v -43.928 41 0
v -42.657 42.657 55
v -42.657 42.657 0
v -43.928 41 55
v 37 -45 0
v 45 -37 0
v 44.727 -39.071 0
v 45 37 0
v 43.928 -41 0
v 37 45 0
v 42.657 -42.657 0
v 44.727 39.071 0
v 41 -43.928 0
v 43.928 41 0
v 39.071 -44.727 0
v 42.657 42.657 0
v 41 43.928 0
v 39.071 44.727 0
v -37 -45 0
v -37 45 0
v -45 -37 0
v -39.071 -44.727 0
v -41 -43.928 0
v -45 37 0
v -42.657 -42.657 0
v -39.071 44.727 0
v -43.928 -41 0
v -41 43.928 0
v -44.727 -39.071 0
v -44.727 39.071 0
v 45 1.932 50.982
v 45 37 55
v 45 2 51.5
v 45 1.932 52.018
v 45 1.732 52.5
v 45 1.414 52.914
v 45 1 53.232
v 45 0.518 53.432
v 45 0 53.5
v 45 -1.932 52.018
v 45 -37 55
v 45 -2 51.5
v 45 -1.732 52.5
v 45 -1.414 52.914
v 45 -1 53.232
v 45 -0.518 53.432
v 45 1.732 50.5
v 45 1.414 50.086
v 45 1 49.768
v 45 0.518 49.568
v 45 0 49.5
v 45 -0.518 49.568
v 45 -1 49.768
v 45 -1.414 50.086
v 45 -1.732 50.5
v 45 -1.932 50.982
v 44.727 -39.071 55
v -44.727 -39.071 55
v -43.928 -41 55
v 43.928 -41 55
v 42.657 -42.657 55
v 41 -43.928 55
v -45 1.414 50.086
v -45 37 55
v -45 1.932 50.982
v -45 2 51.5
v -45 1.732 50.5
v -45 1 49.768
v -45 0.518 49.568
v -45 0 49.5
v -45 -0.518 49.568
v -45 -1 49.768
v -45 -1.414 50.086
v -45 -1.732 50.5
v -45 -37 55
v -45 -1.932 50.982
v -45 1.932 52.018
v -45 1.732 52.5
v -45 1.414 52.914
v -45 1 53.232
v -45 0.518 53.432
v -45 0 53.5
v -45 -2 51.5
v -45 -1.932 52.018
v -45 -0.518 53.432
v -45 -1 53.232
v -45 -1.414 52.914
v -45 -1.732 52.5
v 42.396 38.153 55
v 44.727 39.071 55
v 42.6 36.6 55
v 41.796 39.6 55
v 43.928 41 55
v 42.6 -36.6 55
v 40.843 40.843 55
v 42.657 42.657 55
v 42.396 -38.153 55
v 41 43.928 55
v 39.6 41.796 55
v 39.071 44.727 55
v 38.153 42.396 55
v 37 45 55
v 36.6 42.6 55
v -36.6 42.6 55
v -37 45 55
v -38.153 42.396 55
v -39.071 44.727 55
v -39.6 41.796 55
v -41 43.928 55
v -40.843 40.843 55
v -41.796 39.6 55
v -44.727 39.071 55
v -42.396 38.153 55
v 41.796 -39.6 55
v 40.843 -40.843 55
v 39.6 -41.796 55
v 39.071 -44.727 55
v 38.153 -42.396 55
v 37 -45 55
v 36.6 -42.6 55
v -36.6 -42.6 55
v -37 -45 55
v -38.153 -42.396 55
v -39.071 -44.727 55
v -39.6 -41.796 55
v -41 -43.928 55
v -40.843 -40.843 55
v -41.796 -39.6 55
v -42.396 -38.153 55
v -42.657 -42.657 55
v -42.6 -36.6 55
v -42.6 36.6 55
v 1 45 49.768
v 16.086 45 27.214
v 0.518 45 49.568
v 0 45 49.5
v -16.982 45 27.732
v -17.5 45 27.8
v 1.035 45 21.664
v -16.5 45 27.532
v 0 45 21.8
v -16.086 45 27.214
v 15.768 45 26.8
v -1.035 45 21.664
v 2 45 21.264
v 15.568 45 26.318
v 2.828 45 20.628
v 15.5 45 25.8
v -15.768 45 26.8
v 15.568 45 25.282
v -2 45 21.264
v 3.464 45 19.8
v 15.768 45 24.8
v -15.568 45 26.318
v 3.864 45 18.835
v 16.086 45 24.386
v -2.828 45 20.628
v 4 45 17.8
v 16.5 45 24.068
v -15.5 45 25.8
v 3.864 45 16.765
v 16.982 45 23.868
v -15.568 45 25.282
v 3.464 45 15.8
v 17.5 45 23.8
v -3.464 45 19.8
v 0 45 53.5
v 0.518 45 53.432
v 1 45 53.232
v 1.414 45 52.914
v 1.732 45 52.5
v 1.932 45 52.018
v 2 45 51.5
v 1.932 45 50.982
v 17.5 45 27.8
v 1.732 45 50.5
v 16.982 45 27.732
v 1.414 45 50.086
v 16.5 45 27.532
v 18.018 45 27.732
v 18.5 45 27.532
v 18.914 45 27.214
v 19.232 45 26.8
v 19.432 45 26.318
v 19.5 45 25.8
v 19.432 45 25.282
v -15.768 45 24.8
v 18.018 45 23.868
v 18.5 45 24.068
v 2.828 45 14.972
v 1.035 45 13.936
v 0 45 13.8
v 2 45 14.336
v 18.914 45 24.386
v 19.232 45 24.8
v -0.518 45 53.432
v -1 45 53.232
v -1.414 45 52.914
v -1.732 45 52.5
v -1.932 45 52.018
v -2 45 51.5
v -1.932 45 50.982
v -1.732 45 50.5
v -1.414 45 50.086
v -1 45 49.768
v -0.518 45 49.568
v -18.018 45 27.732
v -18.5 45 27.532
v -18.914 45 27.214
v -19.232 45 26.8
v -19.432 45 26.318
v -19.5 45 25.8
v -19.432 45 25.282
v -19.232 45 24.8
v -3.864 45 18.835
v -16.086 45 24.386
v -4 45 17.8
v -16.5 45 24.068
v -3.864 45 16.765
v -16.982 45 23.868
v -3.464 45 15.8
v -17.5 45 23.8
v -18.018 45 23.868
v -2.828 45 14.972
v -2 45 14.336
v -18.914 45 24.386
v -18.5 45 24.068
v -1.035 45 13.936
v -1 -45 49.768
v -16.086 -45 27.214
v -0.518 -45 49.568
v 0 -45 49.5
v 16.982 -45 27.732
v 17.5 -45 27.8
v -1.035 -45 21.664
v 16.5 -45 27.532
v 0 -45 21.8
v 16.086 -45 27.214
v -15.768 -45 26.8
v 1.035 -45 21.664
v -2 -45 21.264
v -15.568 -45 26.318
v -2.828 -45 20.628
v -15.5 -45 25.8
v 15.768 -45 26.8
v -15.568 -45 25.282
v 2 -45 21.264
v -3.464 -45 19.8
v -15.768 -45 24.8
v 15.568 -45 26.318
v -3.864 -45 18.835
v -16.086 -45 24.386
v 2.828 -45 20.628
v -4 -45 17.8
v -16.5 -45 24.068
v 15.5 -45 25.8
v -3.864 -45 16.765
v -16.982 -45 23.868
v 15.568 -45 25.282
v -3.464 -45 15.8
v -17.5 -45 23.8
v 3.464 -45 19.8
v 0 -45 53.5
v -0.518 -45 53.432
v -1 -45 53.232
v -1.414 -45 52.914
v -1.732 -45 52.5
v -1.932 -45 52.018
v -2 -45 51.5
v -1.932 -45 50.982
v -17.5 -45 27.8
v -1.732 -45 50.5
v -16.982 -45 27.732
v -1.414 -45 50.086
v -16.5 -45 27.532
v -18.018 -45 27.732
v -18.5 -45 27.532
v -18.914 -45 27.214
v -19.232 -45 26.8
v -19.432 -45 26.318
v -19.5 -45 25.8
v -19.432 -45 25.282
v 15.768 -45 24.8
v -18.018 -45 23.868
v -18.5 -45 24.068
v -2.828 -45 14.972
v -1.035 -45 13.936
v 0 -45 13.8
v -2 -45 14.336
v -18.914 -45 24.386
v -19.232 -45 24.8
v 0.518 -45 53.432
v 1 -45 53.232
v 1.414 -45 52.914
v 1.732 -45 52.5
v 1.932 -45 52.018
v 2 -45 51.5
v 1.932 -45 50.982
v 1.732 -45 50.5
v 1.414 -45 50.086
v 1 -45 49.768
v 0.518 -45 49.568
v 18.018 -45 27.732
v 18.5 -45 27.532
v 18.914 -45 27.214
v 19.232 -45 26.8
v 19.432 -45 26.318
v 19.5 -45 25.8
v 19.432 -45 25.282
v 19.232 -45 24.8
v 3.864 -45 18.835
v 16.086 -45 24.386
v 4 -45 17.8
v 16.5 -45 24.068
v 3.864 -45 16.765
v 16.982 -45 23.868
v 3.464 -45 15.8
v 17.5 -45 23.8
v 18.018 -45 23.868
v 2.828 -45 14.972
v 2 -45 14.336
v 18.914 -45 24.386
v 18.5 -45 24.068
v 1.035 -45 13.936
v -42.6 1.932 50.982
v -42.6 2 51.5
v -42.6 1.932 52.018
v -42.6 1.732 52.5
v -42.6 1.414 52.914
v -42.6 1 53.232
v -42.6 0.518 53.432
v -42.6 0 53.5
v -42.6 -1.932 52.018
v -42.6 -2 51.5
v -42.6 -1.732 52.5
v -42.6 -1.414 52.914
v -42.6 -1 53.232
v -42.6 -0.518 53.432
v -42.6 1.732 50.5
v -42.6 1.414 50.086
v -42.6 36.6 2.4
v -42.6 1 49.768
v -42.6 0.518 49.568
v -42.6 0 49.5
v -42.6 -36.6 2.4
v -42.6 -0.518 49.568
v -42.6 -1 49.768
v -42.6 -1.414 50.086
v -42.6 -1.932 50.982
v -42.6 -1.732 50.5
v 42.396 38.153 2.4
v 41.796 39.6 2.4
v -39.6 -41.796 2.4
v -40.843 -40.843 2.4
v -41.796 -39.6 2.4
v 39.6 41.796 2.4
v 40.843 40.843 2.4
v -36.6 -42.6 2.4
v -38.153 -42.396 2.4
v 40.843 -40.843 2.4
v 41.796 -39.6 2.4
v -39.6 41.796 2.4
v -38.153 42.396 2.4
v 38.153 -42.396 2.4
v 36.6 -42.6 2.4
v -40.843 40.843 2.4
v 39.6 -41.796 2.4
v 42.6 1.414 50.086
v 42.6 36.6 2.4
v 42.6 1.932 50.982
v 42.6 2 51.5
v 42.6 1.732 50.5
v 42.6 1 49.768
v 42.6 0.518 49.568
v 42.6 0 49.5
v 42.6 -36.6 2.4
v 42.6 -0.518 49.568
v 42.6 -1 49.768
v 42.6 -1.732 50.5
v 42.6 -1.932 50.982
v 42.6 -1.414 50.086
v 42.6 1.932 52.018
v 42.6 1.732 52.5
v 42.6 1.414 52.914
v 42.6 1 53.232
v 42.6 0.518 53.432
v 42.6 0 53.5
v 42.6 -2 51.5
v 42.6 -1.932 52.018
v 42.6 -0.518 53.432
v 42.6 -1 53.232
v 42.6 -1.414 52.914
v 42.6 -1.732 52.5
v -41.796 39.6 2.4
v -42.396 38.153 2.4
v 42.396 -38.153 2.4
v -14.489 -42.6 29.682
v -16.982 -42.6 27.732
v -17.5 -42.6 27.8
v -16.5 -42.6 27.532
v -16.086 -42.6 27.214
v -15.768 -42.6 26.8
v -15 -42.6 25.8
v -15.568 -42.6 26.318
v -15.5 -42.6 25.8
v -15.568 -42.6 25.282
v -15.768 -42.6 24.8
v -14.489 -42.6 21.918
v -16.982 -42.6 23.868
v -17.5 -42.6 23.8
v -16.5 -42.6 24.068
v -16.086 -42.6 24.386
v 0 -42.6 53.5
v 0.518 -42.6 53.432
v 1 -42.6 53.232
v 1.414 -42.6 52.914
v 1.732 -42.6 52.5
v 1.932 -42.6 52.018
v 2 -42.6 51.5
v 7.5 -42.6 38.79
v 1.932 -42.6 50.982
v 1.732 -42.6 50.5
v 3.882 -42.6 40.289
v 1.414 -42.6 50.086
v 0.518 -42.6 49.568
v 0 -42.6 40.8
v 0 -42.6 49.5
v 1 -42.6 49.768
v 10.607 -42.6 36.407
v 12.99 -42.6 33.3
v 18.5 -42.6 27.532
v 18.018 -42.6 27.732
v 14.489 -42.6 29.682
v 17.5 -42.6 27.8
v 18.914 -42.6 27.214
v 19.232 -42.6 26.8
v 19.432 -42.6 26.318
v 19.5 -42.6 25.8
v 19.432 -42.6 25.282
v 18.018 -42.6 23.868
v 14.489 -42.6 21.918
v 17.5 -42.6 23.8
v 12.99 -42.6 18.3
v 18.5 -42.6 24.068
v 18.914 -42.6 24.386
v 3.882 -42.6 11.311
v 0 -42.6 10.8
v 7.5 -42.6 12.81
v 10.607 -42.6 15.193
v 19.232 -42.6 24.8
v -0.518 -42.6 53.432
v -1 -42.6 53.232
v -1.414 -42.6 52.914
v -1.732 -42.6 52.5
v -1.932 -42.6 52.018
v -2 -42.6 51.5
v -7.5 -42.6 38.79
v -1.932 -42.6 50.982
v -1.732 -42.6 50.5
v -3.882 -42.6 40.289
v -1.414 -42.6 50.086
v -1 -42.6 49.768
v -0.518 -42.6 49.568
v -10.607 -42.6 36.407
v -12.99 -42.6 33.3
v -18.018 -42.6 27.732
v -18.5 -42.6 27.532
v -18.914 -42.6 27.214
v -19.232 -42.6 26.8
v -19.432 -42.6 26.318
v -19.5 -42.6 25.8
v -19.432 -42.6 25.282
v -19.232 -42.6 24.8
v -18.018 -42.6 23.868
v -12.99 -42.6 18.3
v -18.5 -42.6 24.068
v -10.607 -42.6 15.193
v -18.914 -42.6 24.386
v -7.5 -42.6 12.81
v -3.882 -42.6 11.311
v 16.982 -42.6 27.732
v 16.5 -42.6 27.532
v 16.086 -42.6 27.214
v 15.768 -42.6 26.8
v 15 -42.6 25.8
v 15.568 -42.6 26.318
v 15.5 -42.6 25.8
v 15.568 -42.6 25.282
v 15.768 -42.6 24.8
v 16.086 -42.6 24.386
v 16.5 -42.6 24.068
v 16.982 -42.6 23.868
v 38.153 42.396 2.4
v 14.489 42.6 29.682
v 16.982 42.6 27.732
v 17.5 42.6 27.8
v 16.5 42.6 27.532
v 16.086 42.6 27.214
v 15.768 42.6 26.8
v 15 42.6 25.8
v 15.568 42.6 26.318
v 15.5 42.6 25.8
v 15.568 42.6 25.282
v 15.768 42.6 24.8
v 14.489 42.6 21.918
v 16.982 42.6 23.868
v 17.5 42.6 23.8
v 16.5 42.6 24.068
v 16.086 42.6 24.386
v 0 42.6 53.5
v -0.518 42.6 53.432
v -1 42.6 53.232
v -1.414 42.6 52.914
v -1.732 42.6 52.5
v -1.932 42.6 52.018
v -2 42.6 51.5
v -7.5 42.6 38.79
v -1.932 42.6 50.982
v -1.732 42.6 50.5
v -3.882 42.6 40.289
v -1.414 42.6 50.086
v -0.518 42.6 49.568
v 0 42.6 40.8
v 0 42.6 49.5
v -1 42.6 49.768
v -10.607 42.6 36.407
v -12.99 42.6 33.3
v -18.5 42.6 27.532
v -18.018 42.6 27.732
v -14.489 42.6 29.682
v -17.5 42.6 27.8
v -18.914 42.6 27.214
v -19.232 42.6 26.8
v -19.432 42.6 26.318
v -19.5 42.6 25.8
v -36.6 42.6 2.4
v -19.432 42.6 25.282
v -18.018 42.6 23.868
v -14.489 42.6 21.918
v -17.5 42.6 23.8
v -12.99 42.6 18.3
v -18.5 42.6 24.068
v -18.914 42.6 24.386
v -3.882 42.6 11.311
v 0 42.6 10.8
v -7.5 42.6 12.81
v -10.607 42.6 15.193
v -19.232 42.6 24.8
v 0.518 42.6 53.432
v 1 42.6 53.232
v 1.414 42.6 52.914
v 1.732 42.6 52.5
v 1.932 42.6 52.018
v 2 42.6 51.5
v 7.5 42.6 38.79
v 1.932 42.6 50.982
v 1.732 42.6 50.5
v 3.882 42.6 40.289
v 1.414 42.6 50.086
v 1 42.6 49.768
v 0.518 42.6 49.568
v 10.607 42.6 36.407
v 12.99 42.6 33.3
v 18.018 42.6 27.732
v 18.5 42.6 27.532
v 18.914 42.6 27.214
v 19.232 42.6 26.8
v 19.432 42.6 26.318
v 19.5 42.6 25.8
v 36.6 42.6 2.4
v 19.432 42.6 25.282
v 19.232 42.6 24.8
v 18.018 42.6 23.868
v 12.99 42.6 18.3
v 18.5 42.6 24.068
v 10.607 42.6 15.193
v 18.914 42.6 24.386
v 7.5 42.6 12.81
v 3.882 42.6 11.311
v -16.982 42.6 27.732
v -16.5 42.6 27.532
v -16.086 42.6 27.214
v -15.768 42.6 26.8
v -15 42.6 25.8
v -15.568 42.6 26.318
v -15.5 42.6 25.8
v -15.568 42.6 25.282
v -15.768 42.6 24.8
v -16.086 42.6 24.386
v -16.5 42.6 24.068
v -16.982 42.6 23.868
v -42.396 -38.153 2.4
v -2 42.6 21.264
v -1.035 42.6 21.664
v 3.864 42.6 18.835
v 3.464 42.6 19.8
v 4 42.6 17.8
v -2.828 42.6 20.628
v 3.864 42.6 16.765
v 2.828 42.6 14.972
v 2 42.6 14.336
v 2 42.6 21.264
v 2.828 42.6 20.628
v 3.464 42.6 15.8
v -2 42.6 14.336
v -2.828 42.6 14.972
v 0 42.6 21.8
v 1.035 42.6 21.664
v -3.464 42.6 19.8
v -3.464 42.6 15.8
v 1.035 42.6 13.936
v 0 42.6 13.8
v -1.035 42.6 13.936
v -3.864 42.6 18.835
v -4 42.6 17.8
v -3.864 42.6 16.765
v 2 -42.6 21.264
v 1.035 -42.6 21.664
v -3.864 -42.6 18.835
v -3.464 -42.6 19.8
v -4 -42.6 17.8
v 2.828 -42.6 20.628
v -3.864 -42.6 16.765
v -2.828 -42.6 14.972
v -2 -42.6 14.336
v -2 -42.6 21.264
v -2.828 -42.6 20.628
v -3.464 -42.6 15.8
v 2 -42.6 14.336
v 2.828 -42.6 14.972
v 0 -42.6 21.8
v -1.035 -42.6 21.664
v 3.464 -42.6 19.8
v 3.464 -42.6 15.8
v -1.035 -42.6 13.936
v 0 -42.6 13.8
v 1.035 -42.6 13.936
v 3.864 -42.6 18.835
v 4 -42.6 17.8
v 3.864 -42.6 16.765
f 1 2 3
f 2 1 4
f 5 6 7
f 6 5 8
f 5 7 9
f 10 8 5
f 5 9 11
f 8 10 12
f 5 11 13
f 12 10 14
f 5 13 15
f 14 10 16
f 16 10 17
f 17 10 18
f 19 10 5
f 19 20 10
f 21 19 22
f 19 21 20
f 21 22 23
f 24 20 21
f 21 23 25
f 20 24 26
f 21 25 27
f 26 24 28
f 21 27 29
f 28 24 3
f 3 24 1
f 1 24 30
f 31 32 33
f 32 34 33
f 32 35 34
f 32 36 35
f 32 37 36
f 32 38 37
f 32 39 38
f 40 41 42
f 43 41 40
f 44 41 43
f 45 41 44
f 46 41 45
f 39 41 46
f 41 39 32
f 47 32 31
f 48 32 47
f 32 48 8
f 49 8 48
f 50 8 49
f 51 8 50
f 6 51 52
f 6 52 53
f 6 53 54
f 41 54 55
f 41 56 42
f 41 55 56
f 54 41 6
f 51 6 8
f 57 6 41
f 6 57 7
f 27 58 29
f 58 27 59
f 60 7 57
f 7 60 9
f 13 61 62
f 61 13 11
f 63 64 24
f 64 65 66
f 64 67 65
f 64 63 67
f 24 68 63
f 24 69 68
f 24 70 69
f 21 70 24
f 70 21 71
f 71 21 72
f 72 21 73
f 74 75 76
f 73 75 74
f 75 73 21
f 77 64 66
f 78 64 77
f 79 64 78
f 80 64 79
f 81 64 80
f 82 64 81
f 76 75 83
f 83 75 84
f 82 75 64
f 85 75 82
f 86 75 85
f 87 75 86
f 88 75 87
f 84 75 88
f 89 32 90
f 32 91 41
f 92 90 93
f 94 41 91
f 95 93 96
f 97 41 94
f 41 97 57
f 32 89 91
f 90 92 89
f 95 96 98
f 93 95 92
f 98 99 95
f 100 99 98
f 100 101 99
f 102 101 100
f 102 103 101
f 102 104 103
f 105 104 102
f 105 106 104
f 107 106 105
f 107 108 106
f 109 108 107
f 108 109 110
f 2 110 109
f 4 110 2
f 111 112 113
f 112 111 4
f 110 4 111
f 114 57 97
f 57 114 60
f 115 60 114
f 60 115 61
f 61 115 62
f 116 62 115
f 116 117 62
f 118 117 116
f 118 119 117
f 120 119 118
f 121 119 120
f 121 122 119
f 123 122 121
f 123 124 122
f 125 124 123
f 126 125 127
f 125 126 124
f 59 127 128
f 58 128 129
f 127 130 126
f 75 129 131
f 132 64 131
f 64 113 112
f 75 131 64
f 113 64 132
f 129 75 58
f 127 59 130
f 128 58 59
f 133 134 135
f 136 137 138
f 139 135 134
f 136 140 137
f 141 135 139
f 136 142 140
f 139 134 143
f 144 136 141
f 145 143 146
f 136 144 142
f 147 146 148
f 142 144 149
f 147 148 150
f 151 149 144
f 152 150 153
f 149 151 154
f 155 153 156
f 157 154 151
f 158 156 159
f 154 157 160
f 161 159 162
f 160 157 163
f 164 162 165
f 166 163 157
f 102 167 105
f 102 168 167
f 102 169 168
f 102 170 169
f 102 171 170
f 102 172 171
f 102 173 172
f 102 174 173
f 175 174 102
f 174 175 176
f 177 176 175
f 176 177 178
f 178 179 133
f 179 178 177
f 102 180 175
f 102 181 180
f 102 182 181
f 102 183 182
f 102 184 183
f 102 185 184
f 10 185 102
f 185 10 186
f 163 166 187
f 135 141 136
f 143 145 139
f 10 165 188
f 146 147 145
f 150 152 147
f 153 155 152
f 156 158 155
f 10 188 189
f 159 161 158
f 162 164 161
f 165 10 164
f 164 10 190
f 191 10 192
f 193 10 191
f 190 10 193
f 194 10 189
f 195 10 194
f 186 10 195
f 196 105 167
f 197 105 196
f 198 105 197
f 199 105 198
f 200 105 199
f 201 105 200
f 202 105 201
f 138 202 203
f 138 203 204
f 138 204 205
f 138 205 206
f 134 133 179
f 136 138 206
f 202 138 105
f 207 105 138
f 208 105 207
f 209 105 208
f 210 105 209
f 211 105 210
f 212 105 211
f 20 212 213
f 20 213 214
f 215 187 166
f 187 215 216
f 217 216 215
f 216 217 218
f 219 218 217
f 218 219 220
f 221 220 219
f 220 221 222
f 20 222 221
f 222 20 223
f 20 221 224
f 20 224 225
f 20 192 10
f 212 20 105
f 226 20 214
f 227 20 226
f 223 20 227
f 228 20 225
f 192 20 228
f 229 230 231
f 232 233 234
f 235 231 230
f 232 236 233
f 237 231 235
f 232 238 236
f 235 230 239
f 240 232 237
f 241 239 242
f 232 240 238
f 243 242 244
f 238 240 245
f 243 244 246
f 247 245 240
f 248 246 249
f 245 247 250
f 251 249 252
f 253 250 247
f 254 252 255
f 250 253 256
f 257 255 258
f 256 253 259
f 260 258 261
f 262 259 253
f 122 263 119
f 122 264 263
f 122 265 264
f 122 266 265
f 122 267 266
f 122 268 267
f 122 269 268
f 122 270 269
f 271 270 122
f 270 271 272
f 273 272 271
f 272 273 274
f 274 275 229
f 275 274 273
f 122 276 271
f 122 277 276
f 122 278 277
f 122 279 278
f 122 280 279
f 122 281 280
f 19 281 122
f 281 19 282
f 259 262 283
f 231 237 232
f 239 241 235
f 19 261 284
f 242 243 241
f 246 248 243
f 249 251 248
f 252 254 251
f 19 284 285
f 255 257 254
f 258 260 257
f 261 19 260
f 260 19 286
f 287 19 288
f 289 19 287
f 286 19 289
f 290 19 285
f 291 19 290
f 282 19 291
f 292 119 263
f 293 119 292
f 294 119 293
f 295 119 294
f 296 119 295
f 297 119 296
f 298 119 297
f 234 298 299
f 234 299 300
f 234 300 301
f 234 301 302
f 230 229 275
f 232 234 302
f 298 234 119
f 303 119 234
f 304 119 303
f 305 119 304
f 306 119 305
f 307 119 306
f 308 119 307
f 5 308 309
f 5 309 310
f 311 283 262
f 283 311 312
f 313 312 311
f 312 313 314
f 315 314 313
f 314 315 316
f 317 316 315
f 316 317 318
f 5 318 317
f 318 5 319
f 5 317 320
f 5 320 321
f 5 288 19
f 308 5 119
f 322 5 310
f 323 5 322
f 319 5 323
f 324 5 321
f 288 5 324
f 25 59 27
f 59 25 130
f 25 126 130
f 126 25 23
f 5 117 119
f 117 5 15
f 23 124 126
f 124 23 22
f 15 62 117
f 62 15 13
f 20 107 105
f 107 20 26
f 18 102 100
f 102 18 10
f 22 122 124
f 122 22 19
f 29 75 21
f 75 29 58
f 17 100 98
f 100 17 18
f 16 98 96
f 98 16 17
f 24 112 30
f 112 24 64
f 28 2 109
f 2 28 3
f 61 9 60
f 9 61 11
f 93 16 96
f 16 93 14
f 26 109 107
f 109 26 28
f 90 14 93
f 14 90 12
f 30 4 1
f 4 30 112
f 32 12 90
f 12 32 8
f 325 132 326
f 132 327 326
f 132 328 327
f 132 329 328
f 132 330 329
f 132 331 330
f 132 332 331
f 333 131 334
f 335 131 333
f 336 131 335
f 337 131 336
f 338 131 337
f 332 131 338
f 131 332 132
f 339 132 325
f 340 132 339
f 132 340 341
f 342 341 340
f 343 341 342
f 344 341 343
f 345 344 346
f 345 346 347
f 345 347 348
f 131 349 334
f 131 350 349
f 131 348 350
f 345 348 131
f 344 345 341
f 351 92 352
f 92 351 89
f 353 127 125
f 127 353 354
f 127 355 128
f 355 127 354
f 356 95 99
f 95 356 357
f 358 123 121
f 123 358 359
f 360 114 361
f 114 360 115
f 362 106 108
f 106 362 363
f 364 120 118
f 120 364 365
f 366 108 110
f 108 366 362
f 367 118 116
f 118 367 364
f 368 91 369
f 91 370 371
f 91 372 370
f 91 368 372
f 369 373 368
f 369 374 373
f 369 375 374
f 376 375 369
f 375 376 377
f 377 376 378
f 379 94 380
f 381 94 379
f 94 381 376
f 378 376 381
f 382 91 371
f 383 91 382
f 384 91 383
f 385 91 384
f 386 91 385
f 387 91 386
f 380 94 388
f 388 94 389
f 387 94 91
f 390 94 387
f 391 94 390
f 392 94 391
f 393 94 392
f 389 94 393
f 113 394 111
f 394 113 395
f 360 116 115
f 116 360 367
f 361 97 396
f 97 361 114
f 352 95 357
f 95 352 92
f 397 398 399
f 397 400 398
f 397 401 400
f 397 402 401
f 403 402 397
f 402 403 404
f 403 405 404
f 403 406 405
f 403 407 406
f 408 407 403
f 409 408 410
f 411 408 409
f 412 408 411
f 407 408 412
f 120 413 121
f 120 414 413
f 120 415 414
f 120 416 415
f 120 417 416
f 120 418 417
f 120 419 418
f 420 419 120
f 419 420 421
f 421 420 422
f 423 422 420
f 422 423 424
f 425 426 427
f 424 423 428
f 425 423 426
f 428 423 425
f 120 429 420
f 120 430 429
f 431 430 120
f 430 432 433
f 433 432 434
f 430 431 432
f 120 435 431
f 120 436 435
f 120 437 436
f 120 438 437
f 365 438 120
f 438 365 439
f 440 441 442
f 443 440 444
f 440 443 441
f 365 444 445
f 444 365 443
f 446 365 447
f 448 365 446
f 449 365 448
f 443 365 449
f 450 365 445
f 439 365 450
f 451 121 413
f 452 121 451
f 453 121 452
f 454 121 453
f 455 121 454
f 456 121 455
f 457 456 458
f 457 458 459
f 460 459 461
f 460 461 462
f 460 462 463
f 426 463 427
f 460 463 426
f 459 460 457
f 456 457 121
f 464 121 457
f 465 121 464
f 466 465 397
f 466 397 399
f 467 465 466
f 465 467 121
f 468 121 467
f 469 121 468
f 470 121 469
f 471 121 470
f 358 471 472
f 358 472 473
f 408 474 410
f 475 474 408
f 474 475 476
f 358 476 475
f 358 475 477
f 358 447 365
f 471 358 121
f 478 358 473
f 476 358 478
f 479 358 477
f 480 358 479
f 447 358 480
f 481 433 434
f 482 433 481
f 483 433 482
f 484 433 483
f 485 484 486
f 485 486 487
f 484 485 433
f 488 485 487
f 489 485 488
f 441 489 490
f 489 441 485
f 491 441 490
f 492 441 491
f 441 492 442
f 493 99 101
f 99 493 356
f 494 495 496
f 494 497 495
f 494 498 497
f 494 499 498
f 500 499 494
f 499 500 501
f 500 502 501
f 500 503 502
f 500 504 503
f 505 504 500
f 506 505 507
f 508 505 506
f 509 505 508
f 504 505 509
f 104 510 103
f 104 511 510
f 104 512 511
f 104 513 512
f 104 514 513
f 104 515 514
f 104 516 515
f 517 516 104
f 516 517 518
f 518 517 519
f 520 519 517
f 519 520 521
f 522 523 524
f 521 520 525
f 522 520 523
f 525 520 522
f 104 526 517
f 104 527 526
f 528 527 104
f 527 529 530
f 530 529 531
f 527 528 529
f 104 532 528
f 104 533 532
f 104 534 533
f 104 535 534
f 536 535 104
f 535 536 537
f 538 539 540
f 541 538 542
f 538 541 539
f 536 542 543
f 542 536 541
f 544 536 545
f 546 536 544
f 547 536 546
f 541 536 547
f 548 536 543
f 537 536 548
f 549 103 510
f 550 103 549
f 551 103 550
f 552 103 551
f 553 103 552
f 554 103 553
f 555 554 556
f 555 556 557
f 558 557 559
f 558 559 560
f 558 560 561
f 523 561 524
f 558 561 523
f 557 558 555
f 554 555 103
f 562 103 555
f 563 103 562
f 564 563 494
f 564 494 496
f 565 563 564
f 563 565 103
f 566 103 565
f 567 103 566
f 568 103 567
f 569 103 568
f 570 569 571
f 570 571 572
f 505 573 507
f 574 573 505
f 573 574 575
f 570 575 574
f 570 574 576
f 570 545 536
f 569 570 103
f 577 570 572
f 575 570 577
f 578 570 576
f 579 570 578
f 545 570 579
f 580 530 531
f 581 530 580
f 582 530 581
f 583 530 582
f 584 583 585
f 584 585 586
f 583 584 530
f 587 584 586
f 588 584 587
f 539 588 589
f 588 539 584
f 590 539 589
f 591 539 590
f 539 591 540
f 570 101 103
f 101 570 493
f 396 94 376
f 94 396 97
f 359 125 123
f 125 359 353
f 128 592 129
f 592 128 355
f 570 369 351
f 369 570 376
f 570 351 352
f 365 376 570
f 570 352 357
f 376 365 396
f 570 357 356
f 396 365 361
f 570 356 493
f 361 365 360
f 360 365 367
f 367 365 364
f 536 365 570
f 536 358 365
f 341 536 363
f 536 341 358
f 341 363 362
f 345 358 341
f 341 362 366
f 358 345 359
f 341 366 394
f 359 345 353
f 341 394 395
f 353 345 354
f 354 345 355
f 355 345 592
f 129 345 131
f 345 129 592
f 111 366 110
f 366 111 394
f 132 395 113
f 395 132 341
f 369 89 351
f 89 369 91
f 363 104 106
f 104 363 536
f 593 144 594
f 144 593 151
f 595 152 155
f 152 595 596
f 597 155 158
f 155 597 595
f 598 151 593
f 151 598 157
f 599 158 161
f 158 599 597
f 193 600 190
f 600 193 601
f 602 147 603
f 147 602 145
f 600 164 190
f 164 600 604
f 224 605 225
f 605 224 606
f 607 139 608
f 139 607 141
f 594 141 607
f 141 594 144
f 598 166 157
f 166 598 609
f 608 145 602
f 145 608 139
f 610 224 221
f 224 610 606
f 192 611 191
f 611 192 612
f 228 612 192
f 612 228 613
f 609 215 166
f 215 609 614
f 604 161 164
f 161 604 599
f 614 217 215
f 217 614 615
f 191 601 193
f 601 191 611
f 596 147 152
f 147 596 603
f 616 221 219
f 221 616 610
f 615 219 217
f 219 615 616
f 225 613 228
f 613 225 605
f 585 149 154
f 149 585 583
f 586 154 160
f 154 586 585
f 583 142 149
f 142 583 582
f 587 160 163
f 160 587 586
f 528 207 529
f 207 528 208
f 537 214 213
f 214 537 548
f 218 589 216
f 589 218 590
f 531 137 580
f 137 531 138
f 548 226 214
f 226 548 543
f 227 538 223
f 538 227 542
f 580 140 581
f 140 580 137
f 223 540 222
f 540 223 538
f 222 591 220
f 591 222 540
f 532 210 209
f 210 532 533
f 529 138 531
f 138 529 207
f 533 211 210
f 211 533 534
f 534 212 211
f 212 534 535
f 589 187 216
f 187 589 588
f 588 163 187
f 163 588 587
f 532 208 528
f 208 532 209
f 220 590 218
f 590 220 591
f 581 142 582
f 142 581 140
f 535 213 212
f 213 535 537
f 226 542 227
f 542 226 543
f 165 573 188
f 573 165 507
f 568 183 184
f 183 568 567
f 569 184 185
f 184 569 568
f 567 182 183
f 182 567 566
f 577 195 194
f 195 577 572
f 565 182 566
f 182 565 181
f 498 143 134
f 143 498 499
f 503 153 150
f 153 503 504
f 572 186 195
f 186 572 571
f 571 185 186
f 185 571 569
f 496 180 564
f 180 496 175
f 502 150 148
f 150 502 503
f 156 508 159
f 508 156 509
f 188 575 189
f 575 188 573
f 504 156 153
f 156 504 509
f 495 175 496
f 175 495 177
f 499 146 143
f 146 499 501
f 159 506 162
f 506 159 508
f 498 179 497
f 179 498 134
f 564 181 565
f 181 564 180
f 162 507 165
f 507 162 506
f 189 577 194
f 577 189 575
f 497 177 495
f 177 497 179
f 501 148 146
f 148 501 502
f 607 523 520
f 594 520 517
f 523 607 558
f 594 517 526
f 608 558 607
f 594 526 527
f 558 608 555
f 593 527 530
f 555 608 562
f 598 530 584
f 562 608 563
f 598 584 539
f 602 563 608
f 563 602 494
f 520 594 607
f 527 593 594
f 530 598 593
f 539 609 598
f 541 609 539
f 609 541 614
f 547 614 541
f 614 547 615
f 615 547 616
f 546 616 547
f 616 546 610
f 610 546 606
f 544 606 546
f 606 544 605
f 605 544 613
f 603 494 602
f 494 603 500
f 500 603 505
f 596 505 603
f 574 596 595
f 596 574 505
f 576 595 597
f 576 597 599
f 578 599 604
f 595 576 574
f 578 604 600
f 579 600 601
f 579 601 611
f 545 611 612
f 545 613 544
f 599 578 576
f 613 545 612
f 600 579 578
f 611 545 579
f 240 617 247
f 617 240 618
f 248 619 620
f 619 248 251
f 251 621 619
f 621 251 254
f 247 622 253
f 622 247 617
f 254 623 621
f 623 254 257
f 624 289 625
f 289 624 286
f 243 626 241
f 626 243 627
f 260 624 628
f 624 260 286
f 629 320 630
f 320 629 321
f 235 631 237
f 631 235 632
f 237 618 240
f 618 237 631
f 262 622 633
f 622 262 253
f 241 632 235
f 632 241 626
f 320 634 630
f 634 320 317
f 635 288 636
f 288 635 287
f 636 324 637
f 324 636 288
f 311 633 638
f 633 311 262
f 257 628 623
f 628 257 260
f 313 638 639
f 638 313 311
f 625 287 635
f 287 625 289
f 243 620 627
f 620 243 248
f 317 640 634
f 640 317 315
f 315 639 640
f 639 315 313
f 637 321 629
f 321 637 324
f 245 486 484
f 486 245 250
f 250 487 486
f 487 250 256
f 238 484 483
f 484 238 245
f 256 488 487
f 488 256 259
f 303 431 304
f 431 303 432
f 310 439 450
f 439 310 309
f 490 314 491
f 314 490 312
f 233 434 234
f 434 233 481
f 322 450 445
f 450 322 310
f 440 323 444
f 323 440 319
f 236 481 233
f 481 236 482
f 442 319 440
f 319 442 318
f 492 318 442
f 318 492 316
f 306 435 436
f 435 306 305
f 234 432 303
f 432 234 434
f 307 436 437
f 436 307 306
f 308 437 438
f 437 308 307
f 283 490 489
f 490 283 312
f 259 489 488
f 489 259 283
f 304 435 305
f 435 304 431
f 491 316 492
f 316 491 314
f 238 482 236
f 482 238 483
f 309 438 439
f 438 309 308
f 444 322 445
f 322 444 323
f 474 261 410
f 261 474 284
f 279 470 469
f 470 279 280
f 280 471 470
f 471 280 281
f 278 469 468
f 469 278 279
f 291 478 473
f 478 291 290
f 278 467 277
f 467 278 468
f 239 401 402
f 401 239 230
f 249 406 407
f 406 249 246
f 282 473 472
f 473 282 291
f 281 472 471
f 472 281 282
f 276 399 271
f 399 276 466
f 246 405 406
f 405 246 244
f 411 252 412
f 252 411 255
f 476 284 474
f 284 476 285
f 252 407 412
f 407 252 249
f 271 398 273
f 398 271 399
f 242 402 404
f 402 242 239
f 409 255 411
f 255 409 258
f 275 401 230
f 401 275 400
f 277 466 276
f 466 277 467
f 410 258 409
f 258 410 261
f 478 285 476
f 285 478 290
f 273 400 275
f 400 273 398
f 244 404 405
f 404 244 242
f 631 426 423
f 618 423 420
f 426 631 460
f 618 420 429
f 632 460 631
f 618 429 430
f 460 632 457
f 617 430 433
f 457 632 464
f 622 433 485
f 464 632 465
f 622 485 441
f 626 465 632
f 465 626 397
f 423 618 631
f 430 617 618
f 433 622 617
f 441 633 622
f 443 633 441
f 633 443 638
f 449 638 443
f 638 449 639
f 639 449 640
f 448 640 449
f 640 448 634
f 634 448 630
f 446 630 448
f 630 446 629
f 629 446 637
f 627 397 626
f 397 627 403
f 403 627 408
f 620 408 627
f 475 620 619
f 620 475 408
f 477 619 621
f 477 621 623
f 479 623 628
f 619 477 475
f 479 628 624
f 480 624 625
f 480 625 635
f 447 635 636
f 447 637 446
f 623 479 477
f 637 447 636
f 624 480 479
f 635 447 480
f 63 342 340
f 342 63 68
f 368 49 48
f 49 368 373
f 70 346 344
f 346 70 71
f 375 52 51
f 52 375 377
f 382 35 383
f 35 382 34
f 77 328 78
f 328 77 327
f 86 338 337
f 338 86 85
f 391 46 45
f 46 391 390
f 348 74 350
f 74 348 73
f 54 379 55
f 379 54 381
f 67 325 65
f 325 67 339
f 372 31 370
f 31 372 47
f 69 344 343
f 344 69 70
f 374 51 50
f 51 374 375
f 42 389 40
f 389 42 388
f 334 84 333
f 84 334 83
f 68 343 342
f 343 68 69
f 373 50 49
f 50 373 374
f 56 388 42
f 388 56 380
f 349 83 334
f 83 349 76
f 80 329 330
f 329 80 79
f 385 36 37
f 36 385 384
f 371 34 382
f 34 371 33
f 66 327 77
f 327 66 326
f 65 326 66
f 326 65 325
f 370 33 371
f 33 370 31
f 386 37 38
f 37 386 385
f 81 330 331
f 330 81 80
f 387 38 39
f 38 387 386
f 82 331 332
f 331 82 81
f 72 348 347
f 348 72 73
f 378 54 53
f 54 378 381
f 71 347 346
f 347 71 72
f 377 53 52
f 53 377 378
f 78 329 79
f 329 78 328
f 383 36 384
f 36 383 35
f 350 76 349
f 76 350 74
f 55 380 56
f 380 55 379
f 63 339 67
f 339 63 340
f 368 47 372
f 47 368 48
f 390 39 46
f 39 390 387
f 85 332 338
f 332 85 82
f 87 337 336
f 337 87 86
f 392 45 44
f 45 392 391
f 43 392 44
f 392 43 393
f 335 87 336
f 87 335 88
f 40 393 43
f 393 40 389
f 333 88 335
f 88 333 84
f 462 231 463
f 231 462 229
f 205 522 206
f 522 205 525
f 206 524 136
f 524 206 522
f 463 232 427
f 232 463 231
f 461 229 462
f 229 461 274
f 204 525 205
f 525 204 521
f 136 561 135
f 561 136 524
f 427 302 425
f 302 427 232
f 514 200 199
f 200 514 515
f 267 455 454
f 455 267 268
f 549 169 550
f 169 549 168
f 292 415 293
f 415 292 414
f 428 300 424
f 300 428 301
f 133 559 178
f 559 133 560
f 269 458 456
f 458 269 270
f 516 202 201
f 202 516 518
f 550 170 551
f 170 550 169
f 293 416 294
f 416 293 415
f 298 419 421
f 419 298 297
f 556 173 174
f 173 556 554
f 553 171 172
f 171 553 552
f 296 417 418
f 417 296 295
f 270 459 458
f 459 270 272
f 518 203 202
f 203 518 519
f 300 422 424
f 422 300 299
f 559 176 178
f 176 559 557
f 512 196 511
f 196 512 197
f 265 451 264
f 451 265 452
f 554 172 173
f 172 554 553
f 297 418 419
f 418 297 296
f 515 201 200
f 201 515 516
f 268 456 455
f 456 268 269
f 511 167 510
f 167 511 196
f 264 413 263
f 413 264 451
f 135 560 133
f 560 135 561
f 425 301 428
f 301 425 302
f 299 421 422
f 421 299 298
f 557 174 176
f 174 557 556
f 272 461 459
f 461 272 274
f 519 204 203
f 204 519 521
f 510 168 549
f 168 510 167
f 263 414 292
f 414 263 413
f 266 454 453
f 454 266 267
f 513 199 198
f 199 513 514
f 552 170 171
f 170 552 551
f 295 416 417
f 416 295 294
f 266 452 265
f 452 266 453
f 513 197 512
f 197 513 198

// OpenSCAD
/*
 * Module: minirobot_box.scad is the module for minirobot box
 * this works in conjunction with minirobot_core.scad which has the core
 *  functions that actually generate and place the components
 *
 * note that in order for customizer to work, the "Hide Customizer"
 *    checkbox in the "View" menu must be UNCHECKED
 *
 * Author(s): Don Korte
 *
 * github: https://github.com/dnkorte/minirobot_chassis.git
 *
 * NOTE this tool attempts to place components in orientations/distances 
 *  to minimize internal collisions.  not all possible combinations of
 *  parts and box size are compatible.  before printing or committing to
 *  a particular BOM or layout, use the "visualization" tools to
 *  check for collisions with your particular configuration 
 *  
 * MIT License
 * 
 * Copyright (c) 2020 Don Korte
 * 
 * Permission is hereby granted, free of charge, to any person obtaining a copy
 * of this software and associated documentation files (the "Software"), to deal
 * in the Software without restriction, including without limitation the rights
 * to use, copy, modify, merge, publish, distribute, sublicense, and/or sell
 * copies of the Software, and to permit persons to whom the Software is
 * furnished to do so, subject to the following conditions:
 * 
 * The above copyright notice and this permission notice shall be included in all
 * copies or substantial portions of the Software.
 * 
 * THE SOFTWARE IS PROVIDED "AS IS", WITHOUT WARRANTY OF ANY KIND, EXPRESS OR
 * IMPLIED, INCLUDING BUT NOT LIMITED TO THE WARRANTIES OF MERCHANTABILITY,
 * FITNESS FOR A PARTICULAR PURPOSE AND NONINFRINGEMENT. IN NO EVENT SHALL THE
 * AUTHORS OR COPYRIGHT HOLDERS BE LIABLE FOR ANY CLAIM, DAMAGES OR OTHER
 * LIABILITY, WHETHER IN AN ACTION OF CONTRACT, TORT OR OTHERWISE, ARISING FROM,
 * OUT OF OR IN CONNECTION WITH THE SOFTWARE OR THE USE OR OTHER DEALINGS IN THE
 * SOFTWARE.
 */

/* [What PART do you want to model?] */
part="box";  // ["box", "lid", "TT Motor Clamp", "Pololu Motor Clamp", "Lid Feature Plate", "test" ]

/* [Main Box Size (outer)] */
// mm LONG front-to-back (outside)
box_length = 90;      // [90, 96, 100, 111, 120] 
// mm WIDE (outside). Note that 12mm wide wheels allow 76mm box, 10mm wheels allow 80mm box (4in/100mm competition rules)
box_width = 90;       // [76, 80, 90, 96, 101]  
// mm TALL NOT including thickness of lid (default 55) 
height_of_box = 55;  // [44, 55, 70, 90, 100] 
// radius of vertical box corners and lid corners in mm
box_corner_radius = 8;  // [6, 8, 10, 12]

/* [Basic Box Features] */
has_button_back_left = false;
has_button_back_right = false;
has_arcade_front = false;
has_arcade_back = false;
has_toggle_back_ctr = false;
has_toggle_back_left = false;
has_toggle_back_right = false;
has_beeper = false;

/* [Advanced Box Features] */
has_grabber_mounts_narrow = false;
has_grabber_mounts_wide = false;
has_front_sonar = false;
has_back_sonar = false;
linesensor_snout = "none";    // ["none", "PermaProto Small-Mint", "Dual Perma", "Red Tindie Proto"]

/* [Inside-Box Electronics Boards] */
box_bottom_PCB = "PermaProto Mini-Tin"; // ["none", "PermaProto Small-Mint", "Dual Small-Mint", "PermaProto HalfSize", "Red Tindie Proto", "Dual Red Tindie", "Triple Red Tindie", "Feather", "Feather Doubler", "Feather Tripler", "TB6612", "Dual TB6612", "TB6612 and Small-Mint", "Dual TB6612 and Small-Mint", "TB6612 and Feather", "Dual TB6612 and Feather", "QWIIC I2C Motor Driver", "QWIIC I2C Motor Driver + Small-Mint", "QWIIC I2C Motor Driver + Feather",  "L298_motor_driver", "L298 and Small-Mint", "L298 and Feather", "Geared Stepper Driver", "Dual Geared Stepper Driver", "Dual Geared Stepper Driver and Small-Mint", "Dual Geared Stepper Driver and Feather", "Dual Sparkfun EasyDriver", "Dual Sparkfun EasyDriver + Small-Mint", "Dual Sparkfun EasyDriver + Feather", "3 Small-Mint Inline", "Front Small-Mint + Raised Ctr Small-Mint", "F/B Small-Mint + Raised Ctr Small-Mint", "Front Red Tindie + Raised Ctr Red Tindie", "F/B Red Tindie + Raised Ctr Red Tindie", "Front Small-Mint + Raised Ctr Feather", "F/B Small-Mint + Raised Ctr Feather", "Front Red Tindie + Raised Ctr Feather", "F/B Red Tindie + Raised Ctr Feather"]

// Some layouts allow a protoboards or Feathers to be raised higher than driver boards.  This allows you to avoid collisions with motors or other components if your box is tall enough
board_raise_amount = 7; // [7:"No Added Lift (7mm high)", 17:"Lift to 17mm", 22:"Lift to 22mm", 27:"Lift to 27mm"]

/* [Lid Features] */
has_button_lid_left = false;
has_button_lid_right = false;
has_toggle_lid_left = false;
has_toggle_lid_right = false;

/* [Motors, Wheels and Casters] */

motor_type="Geared Stepper";   // ["Geared Stepper", "Sparkfun Stepper", "Yellow TT Horizontal", "Yellow TT Vertical", "Blue TT Horizontal", "Blue TT Vertical", "DFR TT with Encoder H", "DFR TT with Encoder V", "Pololu MiniPlastic Horizontal", "Pololu MiniPlastic Vertical", "N20 Geared with Encoder", "Micro Servo Case"]

motor_mount = "TT uses clamp";  // ["TT uses clamp", "TT uses long bolts through motor" ]

// Most desirably, the motor axle should be centered between the front and back of the box.  If the box is too short for this to happen with the selected motor the scripts will move the motor "forward" to keep it in the box.  If you check this box it will allow the motors to extend out the back of the box in order to keep the shafts centered.  
allow_motors_to_extend_out_back_of_box = false;

wheel_diameter = 59.8; // [ 59.8:Adafruit Skinny Wheel (any hub) 60, 65:Adafruit Thin White TT Wheel 65, 63:Adafruit Orange and Clear TT Wheel 63, 40:Pololu 40x7mm Wheel 40, 60:Pololu 60x8mm Wheel 60, 70:Pololu 70x8mm Wheel 70, 80:Pololu 80x10 Wheel 80, 42:DFR 42x19 Wheel 42, 65:DFR 65mm Rubber Wheel 65, 58:Custom 58x8mm Printed Wheel 58, 67:Custom 67x8mm Printed Wheel 67, 80:Custom 80x8mm Printed Wheel 80 ]

// The caster controls the distance from the bottom of the box to the floor.  The scripts will move the motors up or down to maintain this distance regardless of the wheel diameter selected.  Note if using a line sensor the caster should be 12-20mm
caster_height = 10.1; // [10.1:Pololu 3/8in no spacers (10.1), 11.7:Pololu 3/8in + 1/16 spacer (11.7), 13.3:Pololu 3/8in + 1/8 spacer (13.3), 13.5:Pololu 1/2in no spacers (13.5), 15.5:Pololu 1/2in + 1/16 spacer (15.1), 16.8:Pololu 1/2in + 1/8 spacer (16.8), 19:Custom Printed Peg (19), 19.5:Pololu 1/2in + custom 6mm spacer (19.5), 22.4:Pololu 3/4in no spacers (22.4), 25:Custom Printed Peg (25), 25.6:Pololu 3/4in + 1/8 spacer (25.6) ] 

// Note this clearance gap raises the box a bit and ensures that bumps or irregularities in the floor don't lift wheels off the ground
caster_to_ground_gap = 2; // [ 1, 2, 3 ]


/* [ Power Options] */

// this creates 3.3v from LiPo or NiMH (Feather, Itsy need of this)
want_3v_buck = true;

// this creates 5v from LiPo or NiMH (Teensy, NeoPixels need this, Itsy can use this)
want_5v_boost = true;

// this creates 6-30v from LiPo or NiMH for motors; 
boost_converter_for_motors = "None"; // ["None", "Front Adjustable", "Side Adjustable", "Front Pololu", "Side Pololu"]

power_distribution_buss = "Long Way"; // ["none", "Long Way", "Long Way Set Back", "Wide Way"]

battery="2200 mAH Cylindrical Front Right"; // ["2200 mAH Cylindrical Front Right", "2200 mAH Cylindrical Front Center", "1200 mAH LiPo Front Right", "1200 mAH LiPo Front Center", "500 mAH LiPo Front Right", "500 mAH LiPo Front Center"]

// minimum distance between bottom of battery box and bottom of box (airgap)
airgap_under_batterybox = 10; // [2, 10, 15, 20]


/* [Visualization] */
show_internal_parts_for_collision_check = false;
show_lid_parts_for_collision_check = false;
show_box_walls = true;
height_of_visualized_feathers = 1; // [ 1:1 Board, 2:2 Boards, 3:3 Boards ]

/*
 * ************************************************************************************
 * note this mainline module selects the part AND ALSO ends the configurator variables
 * ************************************************************************************
 */
module draw_part() {
    $fn = 24;

    if(part == "box") {
        box();
    } else if(part == "lid") {
        lid();
    } else if(part == "battery clamp") {
        // nothing
    } else if(part == "TT Motor Clamp") {
        component_tt_motor_clamp();
    } else if(part == "Pololu Motor Clamp") {
        component_pololu_miniplastic_motor_clamp();
    } else if(part == "test") {
        component_qwiic_motor_driver();
    }
}

/*
 * ******************************************************************
 * basic box construction parameters, rarely changed 
 * ******************************************************************
 */
// mm clearance between inner wall of box bottom and outer edge of lid lip
lid_clearance=0.4;  
// thickness of lip in mm (width of its "wall")
lid_lip_thickness = 2;
// height of lip in mm
lid_lip_height = 6; 
// thickness of lid in mm
lid_thickness = 3;   
// thickness of body wall in mm
body_wall_thickness = 2.4; 
// bottom usually same as wall, but may be different
body_bottom_thickness = body_wall_thickness; 
// radius of inside corners on box (1=rectangular inside; default (box_corner_radius-2)
box_corner_inner_radius = box_corner_radius - 2; 
// radius of outside corners on lip on the lid; default (box_corner_inner_radius)
lip_corner_radius = box_corner_inner_radius;  

/*
 * ***********************************************************************
 * basic user preference parameters (3d printer specific), rarely changed 
 * ***********************************************************************
 */
// parameters for holes that will be "self-tapped" by screws
// these may be fine-tuned for your printer
screwhole_radius_M30_passthru = 2;  
screwhole_radius_M30_selftap = 1.40;  
screwhole_radius_M25_passthru = 1.8;  
screwhole_radius_M25_selftap = 1.1; 
screwhole_radius_M20_passthru = 2;  
screwhole_radius_M20_selftap = 1.0;   

// parameters for threaded insert mount (M3; McMaster-Carr)
// note if TI_30_use_threaded_insert == false then self-tap holes are generated
TI30_use_threaded_insert = false;
TI30_mount_diameter = 7;
TI30_through_hole_diameter = 4.3;  
TI30_default_height = 6.0;

// parameters for threaded insert mount (M2.5; Amazon)
// note if TI_25_use_threaded_insert == false then self-tap holes are generated
TI25_use_threaded_insert = false;
TI25_mount_diameter = 7;
TI25_through_hole_diameter = 4.2;  
TI25_default_height = 6.0;

// parameters for threaded insert mount (M2; McMaster-Carr)
// note if TI_20_use_threaded_insert == false then self-tap holes are generated
TI20_use_threaded_insert = true;
TI20_mount_diameter = 6;
TI20_through_hole_diameter = 3.7; 
TI20_default_height = 6.0; 


 
include <core_components.scad>;
include <core_minirobot_placers.scad>;

/*
 * ****************************************
 * calculate these working parameters
 * once their preprequisites are defined
 * ****************************************
 */

// correct for potential non-manifold errors if the lip height is same as mount dia  
use_lid_lip_height = (TI30_mount_diameter == lid_lip_height) ? (lid_lip_height + 0.1) : lid_lip_height;

// and ensure that mount is at least "far enough" away from lid panel that it can be fully round
mount_center_offset_from_boxtop = (lid_lip_height < TI30_mount_diameter) ? (TI30_mount_diameter/2) : (use_lid_lip_height / 2);

wheel_radius = wheel_diameter / 2;
// note motor shaft is lowered by small gap in order to raise box a bit
// so that bumps or surface irregularities don't lift wheels off the ground
shaft_height_above_box_bottom = wheel_radius - caster_height - caster_to_ground_gap;

echo("wheel radius: ", wheel_radius);
echo("caster height: " , caster_height);
echo("shaft over box bottom: ", shaft_height_above_box_bottom);


if ((linesensor_snout != "none") && (caster_height < 12)) {
    echo("<span style='background-color:red'>NOTICE: line follower works best with 12 - 20mm caster; please use a taller caster</span>");
}
if ((linesensor_snout != "none") && (caster_height > 20)) {
    echo("<span style='background-color:red'>NOTICE: line follower works best with 12 - 20mm caster; please use a shorter caster</span>");
}

/*
 * *******************************************************************************
 * pre-calculate some basic parameters to help with placement in placer module
 * *******************************************************************************
 */

// x,y location of box and lid walls (remember that lid is generated "upside down"
box_front_x = -(box_length/2);
box_back_x = +(box_length/2);
box_L_y = -(box_width/2);
box_R_y = +(box_width/2);

lid_front_x = +(box_length/2);
lid_back_x = -(box_length/2);
lid_L_y = -(box_width/2);
lid_R_y = +(box_width/2);

// this means that the battery box (any style) will reach no closer than XX mm above inside box bottom
max_length_for_battbox = height_of_box - body_bottom_thickness - airgap_under_batterybox;

/*
 * *****************************************************************
 * mainline code for drawing parts
 * most standard components are already handled here, by means
 * of configuration parameters, however custom parts may be
 * added by adding appropriate code to these modules
 * *****************************************************************
 */

draw_part();

module box() {
    difference() {
        // the basic hollow box
        if (show_box_walls) {
            difference() {
                roundedbox(box_length, box_width, box_corner_radius, height_of_box);
                translate([0, 0, body_bottom_thickness])  
                    roundedbox((box_length - 2*body_wall_thickness), 
                               (box_width - 2*body_wall_thickness), 
                               box_corner_inner_radius, 
                               (height_of_box - body_wall_thickness+1));
            }
        } else {
            roundedbox(box_length, box_width, box_corner_radius, body_bottom_thickness);
        }
        
      
       // create mounting holes along y side
        translate([-(box_length/2), 0, (height_of_box - mount_center_offset_from_boxtop)]) rotate([0,90,0])  
              cylinder(box_length, screwhole_radius_M30_passthru, screwhole_radius_M30_passthru);
      
        // create mounting holes along x side
        translate([0, -(box_width/2), (height_of_box - mount_center_offset_from_boxtop)]) rotate([0,90,90])  
              cylinder(box_width, screwhole_radius_M30_passthru, screwhole_radius_M30_passthru);
        
        // now enter all the parts that are removed from the box
        place_mini_toggle_switch("holes");
        place_pushbuttons("holes");
        place_arcade_buttons("holes");
        place_geared_stepper_motor("holes");
        place_sparkfun_stepper_motor("holes");
        place_n20_motor("holes");
        place_TT_motor("holes");
        place_pololu_miniplastic_motor("holes");
        place_battery("holes");
        place_power_distribution("holes");
        place_boost_buck("holes");
    }
    
    // now if we want to check for collisions, we show a blue image of lid lip
    if (show_lid_parts_for_collision_check) {
        lip_box_length = box_length - (2 * (body_wall_thickness + lid_clearance));
        lip_box_width = box_width - (2 * (body_wall_thickness + lid_clearance));
        lip_inner_x = lip_box_length - (2 * lid_lip_thickness);
        lip_inner_y = lip_box_width - (2 * lid_lip_thickness);
        
        translate([ 0, 0, height_of_box-lid_lip_height ]) color([ 0, 0, 1 ]) difference() {
            roundedbox(lip_box_length, lip_box_width, lip_corner_radius, use_lid_lip_height);
            translate([ 0, 0, -0.5 ]) roundedbox(lip_inner_x, lip_inner_y, lip_corner_radius-2, use_lid_lip_height+1);
        }
    }
    
    // now enter the parts that are added to the box 
    place_mini_toggle_switch("adds");
    place_pushbuttons("adds");
    place_arcade_buttons("adds");
    place_geared_stepper_motor("adds");
    place_box_bottom_combo();
    place_red_protoboard();
    place_smallmint_protoboard();
    place_feather();
    place_feather_doubler();
    place_feather_tripler();
    place_permaprotohalf();
    place_tb6612();
    place_L298motor_driver();
    place_gearedstepper_driver();
    place_easydriver();
    place_sparkfun_stepper_motor("adds");
    place_n20_motor("adds");
    place_TT_motor("adds");
    place_pololu_miniplastic_motor("adds");    
    place_battery("adds");
    place_power_distribution("adds");
    place_boost_buck("adds");
}

module lid() {
    difference() {
        // here enter all the parts that "add" to the piece
        union() {
            roundedbox(box_length, box_width, box_corner_radius, lid_thickness);
            translate([0, 0, lid_thickness]) lip();  
        }
        
        // here enter all the parts that are "removed" from the lid
        place_mini_toggle_switch("holes");
        place_pushbuttons("holes");
        //place_power_components(mode="holes");
        place_battery("holes");
        place_power_distribution("holes");
        place_boost_buck(mode="holes");
    }
    
    // now enter the parts that are added to the lid
    place_mini_toggle_switch("adds");
    place_pushbuttons("adds");  
    //place_power_components("adds");
    place_battery("adds");
    place_power_distribution("adds");
    place_boost_buck(mode="adds");
}
